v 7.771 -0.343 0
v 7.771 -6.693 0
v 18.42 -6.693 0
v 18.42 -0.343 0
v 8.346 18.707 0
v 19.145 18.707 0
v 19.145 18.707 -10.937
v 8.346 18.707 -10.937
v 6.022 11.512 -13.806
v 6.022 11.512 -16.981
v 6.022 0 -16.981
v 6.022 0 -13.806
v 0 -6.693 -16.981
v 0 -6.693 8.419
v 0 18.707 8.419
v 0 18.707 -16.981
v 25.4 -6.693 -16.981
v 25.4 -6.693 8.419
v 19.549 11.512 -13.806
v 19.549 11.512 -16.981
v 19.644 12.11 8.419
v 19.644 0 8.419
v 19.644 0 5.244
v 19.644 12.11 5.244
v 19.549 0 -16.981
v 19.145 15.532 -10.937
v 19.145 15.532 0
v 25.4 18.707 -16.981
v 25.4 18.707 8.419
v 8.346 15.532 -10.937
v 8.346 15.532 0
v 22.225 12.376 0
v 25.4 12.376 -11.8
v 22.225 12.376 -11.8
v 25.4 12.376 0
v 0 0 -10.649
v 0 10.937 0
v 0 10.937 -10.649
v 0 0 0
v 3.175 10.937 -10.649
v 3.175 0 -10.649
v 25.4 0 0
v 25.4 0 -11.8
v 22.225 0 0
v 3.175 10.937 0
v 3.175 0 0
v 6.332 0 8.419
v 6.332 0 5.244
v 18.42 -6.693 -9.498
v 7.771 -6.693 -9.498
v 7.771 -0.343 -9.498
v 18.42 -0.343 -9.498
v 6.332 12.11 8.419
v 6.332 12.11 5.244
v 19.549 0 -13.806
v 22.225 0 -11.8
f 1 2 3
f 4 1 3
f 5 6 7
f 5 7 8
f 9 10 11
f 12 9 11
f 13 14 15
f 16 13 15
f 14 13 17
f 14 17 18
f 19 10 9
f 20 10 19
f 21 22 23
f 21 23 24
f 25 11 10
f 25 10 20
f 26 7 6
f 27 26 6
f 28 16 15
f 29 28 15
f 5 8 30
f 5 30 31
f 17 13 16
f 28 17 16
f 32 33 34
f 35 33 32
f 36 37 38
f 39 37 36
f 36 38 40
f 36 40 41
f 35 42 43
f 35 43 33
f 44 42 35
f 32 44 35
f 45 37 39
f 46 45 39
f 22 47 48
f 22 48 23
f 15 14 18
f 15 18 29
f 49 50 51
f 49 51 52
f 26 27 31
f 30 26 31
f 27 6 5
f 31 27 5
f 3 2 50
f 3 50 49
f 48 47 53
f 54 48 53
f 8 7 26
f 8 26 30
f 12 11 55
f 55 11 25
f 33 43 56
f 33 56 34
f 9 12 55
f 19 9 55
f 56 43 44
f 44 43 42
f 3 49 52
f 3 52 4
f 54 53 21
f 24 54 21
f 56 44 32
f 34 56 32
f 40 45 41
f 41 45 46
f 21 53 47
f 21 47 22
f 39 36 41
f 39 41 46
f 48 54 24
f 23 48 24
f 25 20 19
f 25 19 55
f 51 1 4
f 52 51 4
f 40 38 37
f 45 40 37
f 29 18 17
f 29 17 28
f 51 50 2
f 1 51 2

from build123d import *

# Parameters (mm, degrees)
F0_W      = 25.4
F0_H      = 25.4
F1_DEPTH  = 25.4
F2_W      = 10.648813
F2_H      = 9.49759
F3_DEPTH  = 6.35
F5_W      = 12.375646
F5_H      = 11.800036
F6_DEPTH  = 3.175
F7_W      = 10.798754
F7_H      = 10.936619
F8_DEPTH  = 3.175
F4_W      = 10.936619
F4_H      = 10.648813
F9_DEPTH  = 3.175
F10_W     = 13.52687
F10_H     = 11.512231
F11_DEPTH = 3.175
F12_W     = 13.312163
F12_H     = 12.109572
F13_DEPTH = 3.175


with BuildPart() as f1:
    # F0 (on Right) → F1 (new body)
    with BuildSketch(Plane.YZ):
        with Locations((6.007374, -4.28054)):
            Rectangle(F0_W, F0_H)
    extrude(amount=F1_DEPTH)


with BuildPart() as f3:
    # F2 (on face) → F3 (new body)
    with BuildSketch(Plane.XZ.offset(6.692626)):
        with Locations((13.095162, -4.748795)):
            Rectangle(F2_W, F2_H)
    extrude(amount=-F3_DEPTH)


with BuildPart() as f6:
    # F5 (on face) → F6 (new body)
    with BuildSketch(Plane.YZ.offset(25.4)):
        with Locations((6.187823, -5.900018)):
            Rectangle(F5_W, F5_H)
    extrude(amount=-F6_DEPTH)


with BuildPart() as f8:
    # F7 (on face) → F8 (new body)
    with BuildSketch(Plane(origin=(0, 18.707374, 0), x_dir=(-1, 0, 0), z_dir=(0, 1, 0))):
        with Locations((-13.745745, -5.46831)):
            Rectangle(F7_W, F7_H)
    extrude(amount=-F8_DEPTH)


with BuildPart() as f9:
    # F4 (on face) → F9 (new body)
    with BuildSketch(Plane(origin=(0, 0, 0), x_dir=(0, -1, 0), z_dir=(-1, 0, 0))):
        with Locations((-5.46831, -5.324406)):
            Rectangle(F4_W, F4_H)
    extrude(amount=-F9_DEPTH)


with BuildPart() as f11:
    # F10 (on face) → F11 (new body)
    with BuildSketch(Plane(origin=(0, 0, -16.98054), x_dir=(1, 0, 0), z_dir=(0, 0, -1))):
        with Locations((12.785627, -5.756115)):
            Rectangle(F10_W, F10_H)
    extrude(amount=-F11_DEPTH)


with BuildPart() as f13:
    # F12 (on face) → F13 (new body)
    with BuildSketch(Plane.XY.offset(8.41946)):
        with Locations((12.987808, 6.054786)):
            Rectangle(F12_W, F12_H)
    extrude(amount=-F13_DEPTH)


solid = Compound([f1.part, f3.part, f6.part, f8.part, f9.part, f11.part, f13.part])
